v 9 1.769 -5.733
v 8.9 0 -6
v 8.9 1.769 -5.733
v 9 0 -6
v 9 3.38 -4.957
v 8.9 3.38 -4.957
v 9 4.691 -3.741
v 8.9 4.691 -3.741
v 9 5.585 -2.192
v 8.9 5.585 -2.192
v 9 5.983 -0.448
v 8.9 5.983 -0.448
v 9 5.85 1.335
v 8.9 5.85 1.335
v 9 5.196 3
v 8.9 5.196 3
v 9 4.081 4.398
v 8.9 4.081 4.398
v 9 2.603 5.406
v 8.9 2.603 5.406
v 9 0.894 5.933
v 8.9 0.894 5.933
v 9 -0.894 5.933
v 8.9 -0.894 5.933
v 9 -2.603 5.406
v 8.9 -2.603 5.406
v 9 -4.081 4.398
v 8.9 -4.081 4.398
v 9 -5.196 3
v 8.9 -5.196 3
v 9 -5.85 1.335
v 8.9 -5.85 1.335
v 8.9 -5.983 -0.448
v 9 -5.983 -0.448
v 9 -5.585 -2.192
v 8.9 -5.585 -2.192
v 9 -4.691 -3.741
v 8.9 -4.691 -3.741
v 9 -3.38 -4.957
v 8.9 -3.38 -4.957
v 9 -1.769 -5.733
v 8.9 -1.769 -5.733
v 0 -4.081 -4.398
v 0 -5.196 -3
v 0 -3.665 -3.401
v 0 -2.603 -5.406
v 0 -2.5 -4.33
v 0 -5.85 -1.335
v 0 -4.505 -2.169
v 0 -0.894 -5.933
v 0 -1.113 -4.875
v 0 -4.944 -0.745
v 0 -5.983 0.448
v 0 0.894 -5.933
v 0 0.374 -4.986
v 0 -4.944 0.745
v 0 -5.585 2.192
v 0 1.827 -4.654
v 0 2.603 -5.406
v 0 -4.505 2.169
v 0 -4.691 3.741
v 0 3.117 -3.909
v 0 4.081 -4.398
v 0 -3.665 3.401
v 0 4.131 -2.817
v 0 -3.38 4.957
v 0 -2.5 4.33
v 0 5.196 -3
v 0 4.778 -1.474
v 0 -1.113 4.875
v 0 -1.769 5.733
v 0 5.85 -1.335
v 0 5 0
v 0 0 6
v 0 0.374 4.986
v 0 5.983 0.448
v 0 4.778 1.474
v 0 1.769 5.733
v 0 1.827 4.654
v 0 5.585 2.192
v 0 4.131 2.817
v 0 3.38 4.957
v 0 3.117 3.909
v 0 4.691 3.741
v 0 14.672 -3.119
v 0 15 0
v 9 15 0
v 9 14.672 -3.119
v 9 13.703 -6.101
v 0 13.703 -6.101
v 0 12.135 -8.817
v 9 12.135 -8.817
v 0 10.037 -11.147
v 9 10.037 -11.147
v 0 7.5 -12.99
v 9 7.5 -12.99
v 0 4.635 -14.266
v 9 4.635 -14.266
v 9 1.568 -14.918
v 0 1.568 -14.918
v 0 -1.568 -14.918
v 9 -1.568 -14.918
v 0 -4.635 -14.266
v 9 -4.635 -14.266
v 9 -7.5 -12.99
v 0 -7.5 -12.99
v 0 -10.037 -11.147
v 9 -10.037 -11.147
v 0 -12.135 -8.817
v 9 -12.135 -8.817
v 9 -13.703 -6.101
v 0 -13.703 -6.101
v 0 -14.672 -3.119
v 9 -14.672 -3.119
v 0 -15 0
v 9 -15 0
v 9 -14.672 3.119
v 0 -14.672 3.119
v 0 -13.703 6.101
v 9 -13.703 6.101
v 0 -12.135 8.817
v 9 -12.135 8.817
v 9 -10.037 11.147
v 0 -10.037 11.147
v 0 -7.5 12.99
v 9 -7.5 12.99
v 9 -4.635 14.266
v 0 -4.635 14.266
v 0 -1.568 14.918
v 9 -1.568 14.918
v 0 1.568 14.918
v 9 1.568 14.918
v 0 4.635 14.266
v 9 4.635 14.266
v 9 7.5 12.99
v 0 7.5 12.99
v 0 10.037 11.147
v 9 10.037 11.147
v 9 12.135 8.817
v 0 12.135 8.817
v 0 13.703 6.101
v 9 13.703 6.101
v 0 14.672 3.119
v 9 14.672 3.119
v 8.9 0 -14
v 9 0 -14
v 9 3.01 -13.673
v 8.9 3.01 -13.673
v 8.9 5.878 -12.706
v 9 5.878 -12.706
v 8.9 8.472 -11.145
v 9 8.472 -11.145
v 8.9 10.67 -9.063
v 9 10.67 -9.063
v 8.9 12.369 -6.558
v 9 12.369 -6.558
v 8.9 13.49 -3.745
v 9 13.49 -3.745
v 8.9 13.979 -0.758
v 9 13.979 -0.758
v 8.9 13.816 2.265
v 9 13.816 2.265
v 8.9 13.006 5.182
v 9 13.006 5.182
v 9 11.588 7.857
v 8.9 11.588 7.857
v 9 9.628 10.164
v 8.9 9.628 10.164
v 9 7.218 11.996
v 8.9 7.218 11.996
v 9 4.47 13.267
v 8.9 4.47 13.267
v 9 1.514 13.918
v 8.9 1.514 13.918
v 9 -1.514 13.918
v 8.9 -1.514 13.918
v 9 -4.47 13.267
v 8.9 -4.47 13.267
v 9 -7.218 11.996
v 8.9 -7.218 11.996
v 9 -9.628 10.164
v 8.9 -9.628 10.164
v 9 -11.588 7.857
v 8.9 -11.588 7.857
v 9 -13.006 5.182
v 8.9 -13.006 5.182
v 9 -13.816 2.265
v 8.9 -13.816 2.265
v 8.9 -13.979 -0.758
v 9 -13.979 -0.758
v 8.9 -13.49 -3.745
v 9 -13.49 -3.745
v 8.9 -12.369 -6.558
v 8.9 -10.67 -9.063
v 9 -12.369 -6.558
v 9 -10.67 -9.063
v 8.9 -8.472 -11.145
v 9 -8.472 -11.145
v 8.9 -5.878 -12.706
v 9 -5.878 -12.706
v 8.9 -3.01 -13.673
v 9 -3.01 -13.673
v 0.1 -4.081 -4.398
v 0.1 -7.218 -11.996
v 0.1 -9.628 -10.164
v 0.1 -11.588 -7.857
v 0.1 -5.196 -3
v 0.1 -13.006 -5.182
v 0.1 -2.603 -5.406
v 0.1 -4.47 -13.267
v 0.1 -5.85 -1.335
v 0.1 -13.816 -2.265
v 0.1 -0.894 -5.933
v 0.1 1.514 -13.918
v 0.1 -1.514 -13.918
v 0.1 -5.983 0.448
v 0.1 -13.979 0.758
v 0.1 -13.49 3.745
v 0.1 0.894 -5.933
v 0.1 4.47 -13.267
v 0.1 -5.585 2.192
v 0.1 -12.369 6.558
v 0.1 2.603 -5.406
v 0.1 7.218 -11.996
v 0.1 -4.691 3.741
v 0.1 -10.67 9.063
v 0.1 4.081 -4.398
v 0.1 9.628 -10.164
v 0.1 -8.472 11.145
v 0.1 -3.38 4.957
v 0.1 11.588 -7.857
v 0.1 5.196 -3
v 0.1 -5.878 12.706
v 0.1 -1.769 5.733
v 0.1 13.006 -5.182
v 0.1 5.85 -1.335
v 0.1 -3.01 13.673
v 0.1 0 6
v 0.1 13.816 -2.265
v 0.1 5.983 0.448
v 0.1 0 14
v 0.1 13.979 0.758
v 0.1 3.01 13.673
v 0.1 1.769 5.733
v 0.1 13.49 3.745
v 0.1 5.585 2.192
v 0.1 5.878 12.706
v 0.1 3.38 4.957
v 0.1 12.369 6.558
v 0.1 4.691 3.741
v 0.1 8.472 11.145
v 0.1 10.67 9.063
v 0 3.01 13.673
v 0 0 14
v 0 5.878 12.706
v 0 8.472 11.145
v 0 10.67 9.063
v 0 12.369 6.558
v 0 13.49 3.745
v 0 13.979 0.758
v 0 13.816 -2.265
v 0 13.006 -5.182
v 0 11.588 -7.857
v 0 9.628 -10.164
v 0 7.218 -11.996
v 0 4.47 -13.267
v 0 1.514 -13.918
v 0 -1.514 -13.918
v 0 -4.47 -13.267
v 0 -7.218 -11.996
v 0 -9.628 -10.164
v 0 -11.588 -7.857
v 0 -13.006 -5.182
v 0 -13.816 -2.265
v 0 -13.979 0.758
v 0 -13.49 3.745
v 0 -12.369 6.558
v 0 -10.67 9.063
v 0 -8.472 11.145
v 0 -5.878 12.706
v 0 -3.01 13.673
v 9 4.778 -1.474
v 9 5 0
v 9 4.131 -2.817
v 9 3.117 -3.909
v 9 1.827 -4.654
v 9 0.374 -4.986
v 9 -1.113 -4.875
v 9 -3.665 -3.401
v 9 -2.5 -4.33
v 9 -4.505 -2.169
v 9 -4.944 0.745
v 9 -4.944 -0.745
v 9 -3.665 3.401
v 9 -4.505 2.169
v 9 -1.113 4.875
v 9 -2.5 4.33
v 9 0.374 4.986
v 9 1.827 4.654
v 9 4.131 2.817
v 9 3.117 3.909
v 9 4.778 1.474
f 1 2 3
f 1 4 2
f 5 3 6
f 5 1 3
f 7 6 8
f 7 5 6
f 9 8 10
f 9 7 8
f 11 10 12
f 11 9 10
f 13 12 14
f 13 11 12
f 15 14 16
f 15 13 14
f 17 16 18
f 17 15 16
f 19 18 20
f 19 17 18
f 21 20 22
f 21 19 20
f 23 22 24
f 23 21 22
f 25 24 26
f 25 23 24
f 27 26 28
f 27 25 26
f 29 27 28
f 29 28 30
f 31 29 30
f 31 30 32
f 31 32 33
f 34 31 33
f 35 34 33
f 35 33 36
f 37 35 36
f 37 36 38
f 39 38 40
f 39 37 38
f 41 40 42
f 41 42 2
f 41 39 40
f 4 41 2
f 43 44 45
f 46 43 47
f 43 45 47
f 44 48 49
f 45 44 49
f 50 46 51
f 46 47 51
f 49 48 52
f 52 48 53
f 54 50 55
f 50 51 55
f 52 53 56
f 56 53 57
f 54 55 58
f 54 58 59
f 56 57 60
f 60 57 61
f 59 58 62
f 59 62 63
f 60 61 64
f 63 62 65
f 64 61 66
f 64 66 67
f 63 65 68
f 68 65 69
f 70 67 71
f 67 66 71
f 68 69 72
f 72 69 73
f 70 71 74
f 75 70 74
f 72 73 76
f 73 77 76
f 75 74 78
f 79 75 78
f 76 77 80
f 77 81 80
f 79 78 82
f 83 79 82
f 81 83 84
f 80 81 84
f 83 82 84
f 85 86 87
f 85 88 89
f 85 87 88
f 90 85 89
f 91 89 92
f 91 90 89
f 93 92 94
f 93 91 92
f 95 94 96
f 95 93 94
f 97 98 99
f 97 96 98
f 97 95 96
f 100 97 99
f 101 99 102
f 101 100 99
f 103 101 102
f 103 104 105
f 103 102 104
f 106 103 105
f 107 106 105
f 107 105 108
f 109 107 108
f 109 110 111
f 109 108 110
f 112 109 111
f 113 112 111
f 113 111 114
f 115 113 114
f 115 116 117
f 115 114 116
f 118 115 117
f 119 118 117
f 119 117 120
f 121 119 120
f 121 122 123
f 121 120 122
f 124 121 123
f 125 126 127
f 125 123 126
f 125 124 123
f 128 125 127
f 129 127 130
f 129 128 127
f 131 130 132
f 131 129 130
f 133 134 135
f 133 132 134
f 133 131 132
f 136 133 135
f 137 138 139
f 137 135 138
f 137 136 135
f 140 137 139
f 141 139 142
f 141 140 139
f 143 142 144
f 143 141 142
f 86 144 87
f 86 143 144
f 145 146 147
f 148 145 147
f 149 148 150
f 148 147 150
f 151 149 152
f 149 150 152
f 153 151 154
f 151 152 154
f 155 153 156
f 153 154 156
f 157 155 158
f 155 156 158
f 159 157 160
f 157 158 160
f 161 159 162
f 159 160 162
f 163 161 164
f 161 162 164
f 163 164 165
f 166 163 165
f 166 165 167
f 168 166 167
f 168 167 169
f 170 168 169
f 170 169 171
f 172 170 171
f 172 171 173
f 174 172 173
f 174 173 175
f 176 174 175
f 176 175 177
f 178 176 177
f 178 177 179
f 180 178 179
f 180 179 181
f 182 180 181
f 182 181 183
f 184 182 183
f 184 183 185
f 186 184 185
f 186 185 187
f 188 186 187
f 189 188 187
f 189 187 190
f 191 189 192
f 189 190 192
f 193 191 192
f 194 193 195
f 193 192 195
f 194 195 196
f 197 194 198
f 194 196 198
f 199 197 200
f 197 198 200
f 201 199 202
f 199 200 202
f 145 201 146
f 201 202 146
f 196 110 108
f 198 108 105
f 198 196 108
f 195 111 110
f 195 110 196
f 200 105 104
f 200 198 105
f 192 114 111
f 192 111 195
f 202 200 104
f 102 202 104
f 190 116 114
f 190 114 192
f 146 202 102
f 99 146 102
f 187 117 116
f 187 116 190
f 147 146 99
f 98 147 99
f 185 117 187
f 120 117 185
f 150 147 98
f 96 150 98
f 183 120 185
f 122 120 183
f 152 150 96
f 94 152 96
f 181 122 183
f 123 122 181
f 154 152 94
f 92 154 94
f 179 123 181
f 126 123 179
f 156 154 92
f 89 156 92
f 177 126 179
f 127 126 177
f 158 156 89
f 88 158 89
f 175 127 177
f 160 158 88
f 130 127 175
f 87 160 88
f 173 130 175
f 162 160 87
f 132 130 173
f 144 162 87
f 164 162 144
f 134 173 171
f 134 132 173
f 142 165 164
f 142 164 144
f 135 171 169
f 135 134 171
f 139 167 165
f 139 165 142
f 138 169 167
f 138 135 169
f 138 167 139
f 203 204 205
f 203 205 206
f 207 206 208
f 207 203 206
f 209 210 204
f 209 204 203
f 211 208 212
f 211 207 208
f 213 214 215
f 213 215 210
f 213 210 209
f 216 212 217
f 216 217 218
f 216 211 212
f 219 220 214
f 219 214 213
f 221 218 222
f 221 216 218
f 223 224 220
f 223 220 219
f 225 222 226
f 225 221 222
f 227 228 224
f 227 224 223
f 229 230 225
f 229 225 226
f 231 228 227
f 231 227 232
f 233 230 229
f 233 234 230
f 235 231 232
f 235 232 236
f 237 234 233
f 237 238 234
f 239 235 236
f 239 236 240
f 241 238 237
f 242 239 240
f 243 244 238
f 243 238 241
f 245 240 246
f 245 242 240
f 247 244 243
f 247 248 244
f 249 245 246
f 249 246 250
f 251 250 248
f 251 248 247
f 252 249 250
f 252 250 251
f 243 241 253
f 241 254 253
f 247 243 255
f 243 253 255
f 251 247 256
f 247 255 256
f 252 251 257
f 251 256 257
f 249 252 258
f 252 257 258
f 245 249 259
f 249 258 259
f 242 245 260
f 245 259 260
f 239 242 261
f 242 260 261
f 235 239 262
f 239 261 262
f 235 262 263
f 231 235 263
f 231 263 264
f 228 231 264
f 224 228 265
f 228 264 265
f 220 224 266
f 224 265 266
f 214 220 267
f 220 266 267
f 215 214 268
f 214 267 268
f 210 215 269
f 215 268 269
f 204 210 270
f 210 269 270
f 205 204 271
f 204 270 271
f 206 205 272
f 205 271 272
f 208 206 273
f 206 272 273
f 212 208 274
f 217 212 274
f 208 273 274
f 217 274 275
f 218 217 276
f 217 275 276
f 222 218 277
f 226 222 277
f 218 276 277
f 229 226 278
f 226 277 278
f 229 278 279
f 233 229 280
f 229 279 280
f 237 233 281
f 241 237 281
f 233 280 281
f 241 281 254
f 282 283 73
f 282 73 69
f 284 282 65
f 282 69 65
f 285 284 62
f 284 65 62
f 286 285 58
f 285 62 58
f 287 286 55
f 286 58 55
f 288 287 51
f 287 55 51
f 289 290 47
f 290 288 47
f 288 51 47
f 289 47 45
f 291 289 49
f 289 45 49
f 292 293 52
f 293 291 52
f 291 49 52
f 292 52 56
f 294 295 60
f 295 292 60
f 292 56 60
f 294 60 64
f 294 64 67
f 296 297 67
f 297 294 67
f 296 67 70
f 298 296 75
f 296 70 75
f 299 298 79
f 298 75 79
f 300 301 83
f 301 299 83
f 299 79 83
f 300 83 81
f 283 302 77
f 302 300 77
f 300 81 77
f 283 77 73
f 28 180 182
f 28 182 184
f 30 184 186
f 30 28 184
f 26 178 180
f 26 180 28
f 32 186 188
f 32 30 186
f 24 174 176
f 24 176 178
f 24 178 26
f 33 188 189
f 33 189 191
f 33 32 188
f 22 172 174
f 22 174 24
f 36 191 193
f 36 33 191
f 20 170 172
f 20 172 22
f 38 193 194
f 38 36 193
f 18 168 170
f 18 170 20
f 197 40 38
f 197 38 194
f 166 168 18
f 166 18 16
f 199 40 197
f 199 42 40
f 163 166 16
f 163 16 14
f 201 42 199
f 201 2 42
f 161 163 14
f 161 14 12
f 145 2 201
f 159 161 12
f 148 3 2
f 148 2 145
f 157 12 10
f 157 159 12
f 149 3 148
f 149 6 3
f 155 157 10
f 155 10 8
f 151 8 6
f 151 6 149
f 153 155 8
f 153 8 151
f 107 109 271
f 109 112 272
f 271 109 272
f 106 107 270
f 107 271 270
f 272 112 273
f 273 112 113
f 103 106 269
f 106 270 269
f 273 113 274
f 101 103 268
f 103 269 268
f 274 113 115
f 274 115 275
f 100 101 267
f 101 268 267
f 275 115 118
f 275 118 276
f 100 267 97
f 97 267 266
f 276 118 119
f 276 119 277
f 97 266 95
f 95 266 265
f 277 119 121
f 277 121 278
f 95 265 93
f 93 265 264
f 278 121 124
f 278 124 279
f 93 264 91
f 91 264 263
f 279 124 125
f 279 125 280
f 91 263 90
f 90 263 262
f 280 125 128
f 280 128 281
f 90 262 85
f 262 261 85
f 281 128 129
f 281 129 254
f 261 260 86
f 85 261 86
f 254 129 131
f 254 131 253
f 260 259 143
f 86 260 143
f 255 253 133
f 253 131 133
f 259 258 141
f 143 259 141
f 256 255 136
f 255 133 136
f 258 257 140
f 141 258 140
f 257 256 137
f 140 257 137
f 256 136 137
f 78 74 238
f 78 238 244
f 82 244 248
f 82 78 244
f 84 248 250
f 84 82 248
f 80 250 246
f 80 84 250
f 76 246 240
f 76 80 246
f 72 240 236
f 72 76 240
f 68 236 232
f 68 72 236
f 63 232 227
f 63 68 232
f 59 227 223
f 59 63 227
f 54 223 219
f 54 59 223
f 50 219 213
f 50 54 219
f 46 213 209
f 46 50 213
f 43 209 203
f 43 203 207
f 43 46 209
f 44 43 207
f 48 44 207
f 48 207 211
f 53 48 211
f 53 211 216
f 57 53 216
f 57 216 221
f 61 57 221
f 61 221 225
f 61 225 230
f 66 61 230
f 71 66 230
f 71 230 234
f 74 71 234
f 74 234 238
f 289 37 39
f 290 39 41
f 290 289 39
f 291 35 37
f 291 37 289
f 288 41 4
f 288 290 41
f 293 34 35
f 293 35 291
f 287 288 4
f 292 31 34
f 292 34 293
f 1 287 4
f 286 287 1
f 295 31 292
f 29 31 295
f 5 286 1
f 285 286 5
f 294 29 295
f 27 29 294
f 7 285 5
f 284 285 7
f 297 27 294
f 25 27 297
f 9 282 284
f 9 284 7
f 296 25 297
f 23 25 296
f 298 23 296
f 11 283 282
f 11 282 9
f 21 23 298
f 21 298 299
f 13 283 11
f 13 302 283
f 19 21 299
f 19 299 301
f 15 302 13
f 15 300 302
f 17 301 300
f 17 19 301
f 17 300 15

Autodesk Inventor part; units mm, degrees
ref_plane "YZ Plane" through (0, 0, 0) normal (1, 0, 0) x (0, 1, 0)
ref_plane "XZ Plane" through (0, 0, 0) normal (0, 1, 0) x (-1, 0, 0)
ref_plane "XY Plane" through (0, 0, 0) normal (0, 0, 1) x (1, 0, 0)
sketch "スケッチ1" plane through (0, 0, 0) normal (1, 0, 0) x (0, 1, 0)
  circle A0 centre (0, 0) radius 5
  circle A1 centre (0, 0) radius 15
  dimension "d0" = 10
  dimension "d1" = 30
extrude "押し出し1" add sketch "スケッチ1" along normal blind 9
sketch "スケッチ2" plane through (9, 0, 0) normal (1, 0, 0) x (0, 0, -1)
  circle A0 centre (0, 0) radius 14
  circle A1 centre (0, 0) radius 6
  dimension "d4" = 28
  dimension "d5" = 12
extrude "押し出し2" cut sketch "スケッチ2" against normal blind 0.1
sketch "スケッチ3" plane through (0, 0, 0) normal (-1, 0, 0) x (0, 0, 1)
  circle A0 centre (0, 0) radius 6
  circle A1 centre (0, 0) radius 14
  dimension "d8" = 12
  dimension "d9" = 28
extrude "押し出し3" cut sketch "スケッチ3" against normal blind 0.1
properties part number "Bearing_6200ZZ" material "鋼、炭素鋼"
